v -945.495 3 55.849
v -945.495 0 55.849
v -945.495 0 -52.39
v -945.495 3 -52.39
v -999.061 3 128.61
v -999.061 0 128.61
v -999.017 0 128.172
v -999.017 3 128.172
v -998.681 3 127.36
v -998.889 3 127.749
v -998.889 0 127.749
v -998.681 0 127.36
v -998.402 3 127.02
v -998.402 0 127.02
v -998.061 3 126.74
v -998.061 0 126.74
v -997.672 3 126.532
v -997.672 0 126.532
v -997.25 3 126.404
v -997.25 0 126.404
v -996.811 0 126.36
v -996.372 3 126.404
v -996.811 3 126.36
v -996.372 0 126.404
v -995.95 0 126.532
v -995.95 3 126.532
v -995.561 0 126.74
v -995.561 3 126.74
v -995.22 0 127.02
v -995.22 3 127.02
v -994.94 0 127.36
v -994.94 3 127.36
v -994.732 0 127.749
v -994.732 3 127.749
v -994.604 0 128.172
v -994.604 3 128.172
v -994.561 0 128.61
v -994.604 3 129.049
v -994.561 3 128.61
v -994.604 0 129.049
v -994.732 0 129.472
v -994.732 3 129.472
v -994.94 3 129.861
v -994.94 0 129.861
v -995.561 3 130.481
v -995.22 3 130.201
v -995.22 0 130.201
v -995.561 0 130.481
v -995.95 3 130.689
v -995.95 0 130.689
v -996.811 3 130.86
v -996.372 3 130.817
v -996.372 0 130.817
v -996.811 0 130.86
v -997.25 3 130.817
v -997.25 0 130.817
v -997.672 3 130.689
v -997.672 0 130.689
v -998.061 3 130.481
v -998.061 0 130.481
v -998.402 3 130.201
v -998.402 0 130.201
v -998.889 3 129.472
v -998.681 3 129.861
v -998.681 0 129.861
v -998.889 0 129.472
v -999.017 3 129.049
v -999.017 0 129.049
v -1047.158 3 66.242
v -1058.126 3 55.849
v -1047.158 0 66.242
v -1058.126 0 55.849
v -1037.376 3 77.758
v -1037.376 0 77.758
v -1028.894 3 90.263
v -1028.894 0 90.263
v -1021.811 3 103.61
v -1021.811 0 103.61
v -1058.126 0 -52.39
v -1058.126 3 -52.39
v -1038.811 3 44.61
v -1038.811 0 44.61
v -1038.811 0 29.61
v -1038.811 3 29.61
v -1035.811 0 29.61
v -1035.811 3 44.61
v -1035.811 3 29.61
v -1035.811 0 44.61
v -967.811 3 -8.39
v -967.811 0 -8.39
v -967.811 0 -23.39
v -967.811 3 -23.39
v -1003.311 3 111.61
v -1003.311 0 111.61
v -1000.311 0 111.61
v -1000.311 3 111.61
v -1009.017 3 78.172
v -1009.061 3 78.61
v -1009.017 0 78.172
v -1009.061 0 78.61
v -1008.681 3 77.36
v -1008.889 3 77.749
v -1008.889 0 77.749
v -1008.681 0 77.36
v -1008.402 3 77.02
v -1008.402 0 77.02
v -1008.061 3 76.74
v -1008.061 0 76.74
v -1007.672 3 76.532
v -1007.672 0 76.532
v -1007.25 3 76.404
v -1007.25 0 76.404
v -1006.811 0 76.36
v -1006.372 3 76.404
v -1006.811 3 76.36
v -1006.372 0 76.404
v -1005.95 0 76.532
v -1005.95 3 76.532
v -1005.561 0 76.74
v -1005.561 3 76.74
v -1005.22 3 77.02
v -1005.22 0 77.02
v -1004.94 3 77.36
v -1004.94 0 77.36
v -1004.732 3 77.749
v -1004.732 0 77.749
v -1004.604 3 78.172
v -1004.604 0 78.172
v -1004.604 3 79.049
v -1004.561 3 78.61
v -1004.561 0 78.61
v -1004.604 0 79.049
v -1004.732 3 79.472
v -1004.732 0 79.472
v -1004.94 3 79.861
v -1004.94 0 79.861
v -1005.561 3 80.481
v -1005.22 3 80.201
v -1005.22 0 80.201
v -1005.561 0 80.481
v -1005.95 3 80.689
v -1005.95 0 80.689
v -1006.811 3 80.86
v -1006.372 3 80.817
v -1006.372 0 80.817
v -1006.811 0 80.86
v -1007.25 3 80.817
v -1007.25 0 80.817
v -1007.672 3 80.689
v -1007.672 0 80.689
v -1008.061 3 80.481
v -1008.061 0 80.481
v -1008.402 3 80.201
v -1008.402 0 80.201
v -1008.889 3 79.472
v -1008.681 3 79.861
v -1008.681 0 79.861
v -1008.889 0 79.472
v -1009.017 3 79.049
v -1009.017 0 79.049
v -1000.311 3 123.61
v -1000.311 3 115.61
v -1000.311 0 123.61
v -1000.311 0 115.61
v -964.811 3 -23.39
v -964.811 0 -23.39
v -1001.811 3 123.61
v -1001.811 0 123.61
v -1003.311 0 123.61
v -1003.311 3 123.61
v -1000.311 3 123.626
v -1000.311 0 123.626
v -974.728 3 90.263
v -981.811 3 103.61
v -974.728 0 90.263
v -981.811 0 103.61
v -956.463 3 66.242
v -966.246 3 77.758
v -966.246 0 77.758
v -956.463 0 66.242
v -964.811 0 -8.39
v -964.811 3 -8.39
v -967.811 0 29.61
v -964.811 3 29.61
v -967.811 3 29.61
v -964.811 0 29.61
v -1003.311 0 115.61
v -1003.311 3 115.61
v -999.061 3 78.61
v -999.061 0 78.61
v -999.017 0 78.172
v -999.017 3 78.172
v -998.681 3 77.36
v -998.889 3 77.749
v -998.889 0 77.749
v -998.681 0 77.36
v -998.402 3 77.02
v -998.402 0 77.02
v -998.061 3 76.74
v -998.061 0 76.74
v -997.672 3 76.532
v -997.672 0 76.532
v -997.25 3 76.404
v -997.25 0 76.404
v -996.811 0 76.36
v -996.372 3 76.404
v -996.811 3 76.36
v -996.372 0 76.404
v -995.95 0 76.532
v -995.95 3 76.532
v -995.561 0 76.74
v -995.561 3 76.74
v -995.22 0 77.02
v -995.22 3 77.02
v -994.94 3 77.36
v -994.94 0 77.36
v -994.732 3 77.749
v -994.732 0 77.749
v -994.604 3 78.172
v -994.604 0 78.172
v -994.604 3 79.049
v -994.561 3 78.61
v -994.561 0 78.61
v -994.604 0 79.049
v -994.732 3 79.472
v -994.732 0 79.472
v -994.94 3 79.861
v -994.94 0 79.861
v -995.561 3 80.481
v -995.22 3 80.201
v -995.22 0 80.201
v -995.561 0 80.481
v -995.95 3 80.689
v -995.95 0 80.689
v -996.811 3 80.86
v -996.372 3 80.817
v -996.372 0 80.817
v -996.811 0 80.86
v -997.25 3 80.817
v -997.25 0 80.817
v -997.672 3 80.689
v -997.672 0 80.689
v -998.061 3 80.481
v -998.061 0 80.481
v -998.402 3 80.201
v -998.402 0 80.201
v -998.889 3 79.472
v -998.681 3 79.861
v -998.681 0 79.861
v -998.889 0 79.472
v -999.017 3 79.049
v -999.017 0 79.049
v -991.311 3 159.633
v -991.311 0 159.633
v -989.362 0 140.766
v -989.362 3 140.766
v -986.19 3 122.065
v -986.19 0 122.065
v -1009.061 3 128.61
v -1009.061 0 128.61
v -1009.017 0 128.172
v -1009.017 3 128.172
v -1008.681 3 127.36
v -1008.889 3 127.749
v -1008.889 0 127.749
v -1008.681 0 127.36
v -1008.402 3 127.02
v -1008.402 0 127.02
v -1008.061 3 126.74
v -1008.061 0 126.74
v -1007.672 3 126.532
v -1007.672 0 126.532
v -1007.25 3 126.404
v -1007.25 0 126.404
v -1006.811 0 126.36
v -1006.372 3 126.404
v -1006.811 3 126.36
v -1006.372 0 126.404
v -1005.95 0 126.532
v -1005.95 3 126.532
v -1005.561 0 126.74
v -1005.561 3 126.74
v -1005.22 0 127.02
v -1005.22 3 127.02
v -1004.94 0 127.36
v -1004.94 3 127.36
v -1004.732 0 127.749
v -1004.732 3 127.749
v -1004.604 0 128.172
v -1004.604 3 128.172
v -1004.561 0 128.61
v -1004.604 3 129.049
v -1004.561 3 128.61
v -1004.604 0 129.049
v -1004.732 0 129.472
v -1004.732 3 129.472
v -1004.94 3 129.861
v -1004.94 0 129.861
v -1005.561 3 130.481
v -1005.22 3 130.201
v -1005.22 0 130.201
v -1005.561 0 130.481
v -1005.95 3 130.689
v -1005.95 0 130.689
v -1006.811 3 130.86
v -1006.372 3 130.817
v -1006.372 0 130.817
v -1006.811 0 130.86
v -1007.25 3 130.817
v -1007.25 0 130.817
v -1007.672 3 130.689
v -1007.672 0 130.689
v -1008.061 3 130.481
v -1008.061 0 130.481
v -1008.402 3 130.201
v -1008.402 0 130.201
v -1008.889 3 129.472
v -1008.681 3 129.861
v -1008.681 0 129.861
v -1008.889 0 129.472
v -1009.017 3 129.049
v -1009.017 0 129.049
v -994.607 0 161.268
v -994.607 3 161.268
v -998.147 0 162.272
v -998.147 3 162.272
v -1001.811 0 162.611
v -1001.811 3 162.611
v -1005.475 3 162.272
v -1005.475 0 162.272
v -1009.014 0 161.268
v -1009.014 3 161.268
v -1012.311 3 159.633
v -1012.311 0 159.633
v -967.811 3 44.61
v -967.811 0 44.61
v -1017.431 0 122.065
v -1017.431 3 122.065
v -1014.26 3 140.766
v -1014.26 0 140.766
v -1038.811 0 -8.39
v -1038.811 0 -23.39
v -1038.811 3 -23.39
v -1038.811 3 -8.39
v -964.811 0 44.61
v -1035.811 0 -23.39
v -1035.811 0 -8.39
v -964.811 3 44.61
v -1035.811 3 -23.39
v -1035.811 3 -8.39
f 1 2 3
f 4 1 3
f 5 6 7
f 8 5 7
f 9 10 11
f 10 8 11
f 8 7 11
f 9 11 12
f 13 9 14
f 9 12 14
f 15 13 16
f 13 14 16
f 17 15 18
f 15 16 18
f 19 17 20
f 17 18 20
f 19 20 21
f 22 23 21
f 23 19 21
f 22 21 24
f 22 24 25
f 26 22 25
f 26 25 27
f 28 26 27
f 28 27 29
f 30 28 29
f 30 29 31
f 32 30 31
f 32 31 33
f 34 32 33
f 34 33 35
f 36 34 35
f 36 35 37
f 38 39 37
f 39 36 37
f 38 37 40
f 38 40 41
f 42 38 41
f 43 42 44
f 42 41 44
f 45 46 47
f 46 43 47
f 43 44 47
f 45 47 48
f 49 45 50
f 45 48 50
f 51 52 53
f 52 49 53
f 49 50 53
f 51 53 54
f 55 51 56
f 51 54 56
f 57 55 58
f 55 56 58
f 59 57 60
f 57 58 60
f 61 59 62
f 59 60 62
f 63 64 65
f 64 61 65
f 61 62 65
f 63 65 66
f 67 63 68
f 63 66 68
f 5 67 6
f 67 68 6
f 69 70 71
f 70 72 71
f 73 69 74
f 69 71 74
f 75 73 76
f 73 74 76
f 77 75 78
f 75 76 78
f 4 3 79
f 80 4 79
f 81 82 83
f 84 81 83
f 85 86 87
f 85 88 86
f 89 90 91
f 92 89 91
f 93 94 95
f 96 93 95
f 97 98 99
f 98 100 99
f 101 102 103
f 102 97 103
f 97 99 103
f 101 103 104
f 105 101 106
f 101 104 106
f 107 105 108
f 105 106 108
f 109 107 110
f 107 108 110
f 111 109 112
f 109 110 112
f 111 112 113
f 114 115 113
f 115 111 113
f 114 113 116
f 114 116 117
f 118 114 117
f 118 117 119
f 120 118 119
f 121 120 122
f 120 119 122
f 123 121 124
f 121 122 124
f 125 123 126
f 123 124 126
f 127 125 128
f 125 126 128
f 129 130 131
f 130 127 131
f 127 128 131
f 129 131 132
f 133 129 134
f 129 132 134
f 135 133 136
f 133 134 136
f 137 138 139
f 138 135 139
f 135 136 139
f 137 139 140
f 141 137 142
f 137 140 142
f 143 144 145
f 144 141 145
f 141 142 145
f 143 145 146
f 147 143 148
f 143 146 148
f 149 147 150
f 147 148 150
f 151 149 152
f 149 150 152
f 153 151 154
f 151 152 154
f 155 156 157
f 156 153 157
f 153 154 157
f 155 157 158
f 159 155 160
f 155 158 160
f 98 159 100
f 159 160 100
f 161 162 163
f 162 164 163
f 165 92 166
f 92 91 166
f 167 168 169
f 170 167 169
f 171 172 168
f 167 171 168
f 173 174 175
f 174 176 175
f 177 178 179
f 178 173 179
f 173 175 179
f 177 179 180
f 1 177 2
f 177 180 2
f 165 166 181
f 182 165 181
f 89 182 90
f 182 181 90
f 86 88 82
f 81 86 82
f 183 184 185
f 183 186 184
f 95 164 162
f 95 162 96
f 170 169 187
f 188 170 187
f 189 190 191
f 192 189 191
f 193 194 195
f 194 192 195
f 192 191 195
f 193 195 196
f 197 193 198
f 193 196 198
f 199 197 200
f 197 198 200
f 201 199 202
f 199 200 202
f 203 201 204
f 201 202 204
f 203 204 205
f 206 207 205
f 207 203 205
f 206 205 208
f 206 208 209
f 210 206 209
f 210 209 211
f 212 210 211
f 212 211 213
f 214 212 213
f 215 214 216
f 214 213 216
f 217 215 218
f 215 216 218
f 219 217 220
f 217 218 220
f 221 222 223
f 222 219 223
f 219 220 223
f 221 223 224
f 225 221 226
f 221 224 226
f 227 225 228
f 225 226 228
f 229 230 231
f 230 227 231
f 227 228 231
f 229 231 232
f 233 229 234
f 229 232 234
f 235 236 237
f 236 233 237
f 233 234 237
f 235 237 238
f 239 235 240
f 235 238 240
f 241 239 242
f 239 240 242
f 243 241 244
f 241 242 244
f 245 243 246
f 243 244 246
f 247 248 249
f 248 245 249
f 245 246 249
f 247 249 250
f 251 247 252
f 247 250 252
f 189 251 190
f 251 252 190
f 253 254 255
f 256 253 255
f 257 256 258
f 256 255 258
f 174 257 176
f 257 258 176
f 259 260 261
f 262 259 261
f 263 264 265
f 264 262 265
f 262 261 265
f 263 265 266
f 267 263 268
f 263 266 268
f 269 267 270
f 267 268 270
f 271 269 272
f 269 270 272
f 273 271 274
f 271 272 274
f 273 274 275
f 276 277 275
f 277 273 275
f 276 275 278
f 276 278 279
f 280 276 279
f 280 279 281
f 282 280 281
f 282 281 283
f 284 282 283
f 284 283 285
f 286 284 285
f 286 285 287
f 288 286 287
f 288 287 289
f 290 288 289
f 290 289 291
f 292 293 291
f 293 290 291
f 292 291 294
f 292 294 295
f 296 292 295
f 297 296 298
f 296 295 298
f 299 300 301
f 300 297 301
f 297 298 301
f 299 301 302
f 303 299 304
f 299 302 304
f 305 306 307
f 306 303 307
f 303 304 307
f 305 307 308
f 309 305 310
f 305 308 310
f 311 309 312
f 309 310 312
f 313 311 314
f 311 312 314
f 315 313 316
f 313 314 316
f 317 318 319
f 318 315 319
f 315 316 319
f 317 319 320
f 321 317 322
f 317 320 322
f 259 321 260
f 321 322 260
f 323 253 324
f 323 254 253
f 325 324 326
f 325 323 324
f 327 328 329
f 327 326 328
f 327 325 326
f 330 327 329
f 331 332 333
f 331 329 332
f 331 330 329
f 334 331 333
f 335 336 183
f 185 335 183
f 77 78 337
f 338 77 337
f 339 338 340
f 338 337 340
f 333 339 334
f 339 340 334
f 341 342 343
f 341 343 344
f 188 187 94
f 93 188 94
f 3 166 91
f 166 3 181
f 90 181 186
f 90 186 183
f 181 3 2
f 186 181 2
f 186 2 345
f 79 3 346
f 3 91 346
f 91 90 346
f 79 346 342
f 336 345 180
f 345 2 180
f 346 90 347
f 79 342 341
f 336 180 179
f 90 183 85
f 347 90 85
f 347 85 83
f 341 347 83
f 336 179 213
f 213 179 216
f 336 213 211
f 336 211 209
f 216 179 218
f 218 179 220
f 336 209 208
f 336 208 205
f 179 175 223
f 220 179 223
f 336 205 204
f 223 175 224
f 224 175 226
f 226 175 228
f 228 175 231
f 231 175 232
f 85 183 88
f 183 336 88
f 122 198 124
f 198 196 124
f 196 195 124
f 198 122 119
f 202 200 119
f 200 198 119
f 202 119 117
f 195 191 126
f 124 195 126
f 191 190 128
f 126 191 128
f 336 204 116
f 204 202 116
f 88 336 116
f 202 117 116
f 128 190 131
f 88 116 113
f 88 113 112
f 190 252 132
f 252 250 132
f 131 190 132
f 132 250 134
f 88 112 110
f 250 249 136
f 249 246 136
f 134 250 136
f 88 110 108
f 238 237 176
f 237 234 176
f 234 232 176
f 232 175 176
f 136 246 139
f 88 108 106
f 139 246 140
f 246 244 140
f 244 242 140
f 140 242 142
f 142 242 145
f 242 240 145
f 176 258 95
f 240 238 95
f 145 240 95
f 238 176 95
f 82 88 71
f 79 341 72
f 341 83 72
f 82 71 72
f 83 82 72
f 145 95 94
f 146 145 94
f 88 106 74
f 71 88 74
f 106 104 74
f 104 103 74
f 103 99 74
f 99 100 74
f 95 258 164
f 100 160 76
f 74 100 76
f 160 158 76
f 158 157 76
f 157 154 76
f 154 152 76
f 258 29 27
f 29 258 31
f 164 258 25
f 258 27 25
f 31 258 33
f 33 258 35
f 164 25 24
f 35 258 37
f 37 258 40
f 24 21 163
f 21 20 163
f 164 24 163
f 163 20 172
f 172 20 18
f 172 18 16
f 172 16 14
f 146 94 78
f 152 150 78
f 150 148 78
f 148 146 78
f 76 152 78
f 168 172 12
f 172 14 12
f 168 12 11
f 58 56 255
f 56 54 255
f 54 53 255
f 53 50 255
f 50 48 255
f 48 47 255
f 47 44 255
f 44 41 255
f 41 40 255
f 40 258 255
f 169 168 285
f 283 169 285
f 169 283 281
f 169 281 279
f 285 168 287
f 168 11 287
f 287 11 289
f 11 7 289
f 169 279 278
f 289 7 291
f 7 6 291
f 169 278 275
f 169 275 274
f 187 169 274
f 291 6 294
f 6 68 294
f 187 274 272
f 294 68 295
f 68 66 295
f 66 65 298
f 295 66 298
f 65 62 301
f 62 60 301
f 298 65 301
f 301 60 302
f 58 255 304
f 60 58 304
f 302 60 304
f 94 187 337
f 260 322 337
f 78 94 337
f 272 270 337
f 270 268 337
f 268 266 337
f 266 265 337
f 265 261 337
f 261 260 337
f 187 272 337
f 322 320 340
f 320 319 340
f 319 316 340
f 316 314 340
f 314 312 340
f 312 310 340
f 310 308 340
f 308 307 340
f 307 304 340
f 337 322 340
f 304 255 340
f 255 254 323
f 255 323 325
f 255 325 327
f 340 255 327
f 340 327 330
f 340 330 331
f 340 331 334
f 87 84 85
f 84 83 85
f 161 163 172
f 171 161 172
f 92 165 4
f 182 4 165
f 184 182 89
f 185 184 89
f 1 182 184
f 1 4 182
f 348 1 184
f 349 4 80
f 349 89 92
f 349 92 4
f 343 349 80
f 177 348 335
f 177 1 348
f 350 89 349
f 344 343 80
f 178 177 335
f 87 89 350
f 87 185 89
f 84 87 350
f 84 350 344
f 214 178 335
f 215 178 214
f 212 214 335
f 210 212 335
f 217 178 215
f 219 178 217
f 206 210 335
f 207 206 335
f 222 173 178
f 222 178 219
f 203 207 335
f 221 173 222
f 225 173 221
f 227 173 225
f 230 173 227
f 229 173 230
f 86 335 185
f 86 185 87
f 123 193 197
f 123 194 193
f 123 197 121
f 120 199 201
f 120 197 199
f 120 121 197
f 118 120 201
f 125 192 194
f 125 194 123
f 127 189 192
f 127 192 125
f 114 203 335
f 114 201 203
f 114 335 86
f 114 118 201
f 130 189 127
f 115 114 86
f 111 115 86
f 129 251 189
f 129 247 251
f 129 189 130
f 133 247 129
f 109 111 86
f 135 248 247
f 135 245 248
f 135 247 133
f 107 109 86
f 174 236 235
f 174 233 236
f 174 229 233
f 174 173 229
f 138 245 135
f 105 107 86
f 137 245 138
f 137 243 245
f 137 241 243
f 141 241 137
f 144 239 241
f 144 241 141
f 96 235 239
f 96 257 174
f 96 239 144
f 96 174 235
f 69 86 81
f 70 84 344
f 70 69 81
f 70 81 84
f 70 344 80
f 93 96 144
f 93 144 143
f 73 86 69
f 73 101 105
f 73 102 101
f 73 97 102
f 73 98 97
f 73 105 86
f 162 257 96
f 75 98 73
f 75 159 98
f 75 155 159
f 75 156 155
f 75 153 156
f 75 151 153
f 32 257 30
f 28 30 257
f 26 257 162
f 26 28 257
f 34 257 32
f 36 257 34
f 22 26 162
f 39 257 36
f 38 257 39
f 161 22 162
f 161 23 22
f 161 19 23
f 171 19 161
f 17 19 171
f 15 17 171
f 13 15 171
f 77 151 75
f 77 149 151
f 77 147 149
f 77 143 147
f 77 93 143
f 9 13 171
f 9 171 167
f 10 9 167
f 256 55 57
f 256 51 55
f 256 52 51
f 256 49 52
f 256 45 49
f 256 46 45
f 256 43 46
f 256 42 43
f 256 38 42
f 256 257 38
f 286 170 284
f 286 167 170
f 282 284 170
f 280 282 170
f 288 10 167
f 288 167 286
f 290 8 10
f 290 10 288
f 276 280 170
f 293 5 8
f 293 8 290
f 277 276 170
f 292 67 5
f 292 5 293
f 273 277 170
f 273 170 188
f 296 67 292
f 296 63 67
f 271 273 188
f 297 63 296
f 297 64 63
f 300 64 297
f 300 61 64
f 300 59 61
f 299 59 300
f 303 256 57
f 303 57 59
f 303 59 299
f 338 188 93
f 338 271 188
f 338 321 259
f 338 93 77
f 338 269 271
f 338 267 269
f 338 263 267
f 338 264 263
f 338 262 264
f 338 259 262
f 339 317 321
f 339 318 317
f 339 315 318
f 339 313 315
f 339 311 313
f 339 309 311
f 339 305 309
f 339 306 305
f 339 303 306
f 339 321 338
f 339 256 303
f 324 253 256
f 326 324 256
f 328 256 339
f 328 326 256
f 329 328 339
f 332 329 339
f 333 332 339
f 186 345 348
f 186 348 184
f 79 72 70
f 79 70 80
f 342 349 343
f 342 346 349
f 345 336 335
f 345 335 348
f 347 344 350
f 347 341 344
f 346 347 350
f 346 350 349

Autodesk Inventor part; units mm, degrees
ref_plane "YZ Plane" through (0, 0, 0) normal (1, 0, 0) x (0, 1, 0)
ref_plane "XZ Plane" through (0, 0, 0) normal (0, 1, 0) x (-1, 0, 0)
ref_plane "XY Plane" through (0, 0, 0) normal (0, 0, 1) x (1, 0, 0)
sketch "Sketch1" plane through (0, 0, 0) normal (0, 1, 0) x (-1, 0, 0)
  line L0 (945.4953, -52.3895) -> (1058.1259, -52.3895)
  arc A0 (945.4953, 55.8486) -> (981.8106, 103.6105) centre (854.964, 162.3701) ccw
  arc A1 (1021.8106, 103.6105) -> (1058.1259, 55.8486) centre (1148.6572, 162.3701) ccw
  line L1 (967.8106, 44.6105) -> (967.8106, 29.6105)
  line L2 (967.8106, -8.3895) -> (967.8106, -23.3895)
  line L3 (967.8106, 44.6105) -> (964.8106, 44.6105)
  line L4 (964.8106, 44.6105) -> (964.8106, 29.6105)
  line L5 (964.8106, 29.6105) -> (967.8106, 29.6105)
  line L6 (967.8106, -23.3895) -> (964.8106, -23.3895)
  line L7 (964.8106, -23.3895) -> (964.8106, -8.3895)
  line L8 (964.8106, -8.3895) -> (967.8106, -8.3895)
  line L9 (1035.8106, 44.6105) -> (1035.8106, 29.6105)
  line L10 (1035.8106, -8.3895) -> (1035.8106, -23.3895)
  line L11 (1035.8106, 44.6105) -> (1038.8106, 44.6105)
  line L12 (1038.8106, 44.6105) -> (1038.8106, 29.6105)
  line L13 (1038.8106, 29.6105) -> (1035.8106, 29.6105)
  line L14 (1035.8106, -23.3895) -> (1038.8106, -23.3895)
  line L15 (1038.8106, -23.3895) -> (1038.8106, -8.3895)
  line L16 (1038.8106, -8.3895) -> (1035.8106, -8.3895)
  line L17 (1058.1259, 55.8486) -> (1058.1259, -52.3895)
  line L18 (945.4953, 55.8486) -> (945.4953, -52.3895)
  line L19 (1001.8106, 123.6105) -> (1003.3106, 123.6105)
  line L20 (1003.3106, 123.6105) -> (1003.3106, 115.6105)
  line L21 (1003.3106, 111.6105) -> (1000.3106, 111.6105)
  line L22 (1000.3106, 115.6105) -> (1000.3106, 123.6257)
  line L23 (1000.3106, 123.6257) -> (1001.8106, 123.6105)
  line L24 (1003.3106, 115.6105) -> (1003.3106, 111.6105)
  line L25 (1000.3106, 115.6105) -> (1000.3106, 111.6105)
  arc A2 (1012.3106, 159.6326) -> (991.3106, 159.6326) centre (1001.8106, 142.6105) ccw
  arc A3 (981.8106, 103.6105) -> (991.3106, 159.6326) centre (700.3575, 180.1548) ccw
  arc A4 (1012.3106, 159.6326) -> (1021.8106, 103.6105) centre (1303.2637, 180.1548) ccw
  arc A5 (945.4953, 55.8486) -> (981.8106, 103.6105) centre (854.964, 162.3701) ccw
  arc A6 (1021.8106, 103.6105) -> (1058.1259, 55.8486) centre (1148.6572, 162.3701) ccw
  line L26 (1001.8106, 123.6105) -> (1003.3106, 123.6105)
  line L27 (1003.3106, 123.6105) -> (1003.3106, 115.6105)
  line L28 (1003.3106, 111.6105) -> (1000.3106, 111.6105)
  line L29 (1000.3106, 115.6105) -> (1000.3106, 123.6105)
  line L30 (1000.3106, 123.6105) -> (1001.8106, 123.6105)
  line L31 (1000.3106, 111.6105) -> (1000.3106, 115.6105)
  line L32 (1003.3106, 111.6105) -> (1003.3106, 115.6105)
  line L33 (1001.8106, 103.6105) -> (1086.8106, 103.6105) construction
  line L34 (1001.8106, 103.6105) -> (916.8106, 103.6105) construction
  line L35 (1086.8106, 133.6105) -> (1071.8106, 133.6105) construction
  line L36 (1071.8106, 133.6105) -> (1071.8106, 73.6105) construction
  line L37 (1071.8106, 73.6105) -> (1101.8106, 73.6105) construction
  line L38 (1101.8106, 73.6105) -> (1101.8106, 133.6105) construction
  line L39 (1101.8106, 133.6105) -> (1086.8106, 133.6105) construction
  line L40 (916.8106, 133.6105) -> (931.8106, 133.6105) construction
  line L41 (931.8106, 133.6105) -> (931.8106, 73.6105) construction
  line L42 (931.8106, 73.6105) -> (901.8106, 73.6105) construction
  line L43 (901.8106, 73.6105) -> (901.8106, 133.6105) construction
  line L44 (901.8106, 133.6105) -> (916.8106, 133.6105) construction
  line L45 (931.8106, 103.6105) -> (935.8106, 103.6105) construction
  line L46 (935.8106, 103.6105) -> (935.8106, 108.6105) construction
  line L47 (1071.8106, 103.6105) -> (1067.8106, 103.6105) construction
  line L48 (1067.8106, 103.6105) -> (1067.8106, 108.6105) construction
  line L49 (935.8106, 103.6105) -> (939.8106, 103.6105) construction
  line L50 (1067.8106, 103.6105) -> (1063.8106, 103.6105) construction
  line L51 (939.8106, 103.6105) -> (949.8106, 103.6105) construction
  line L52 (949.8106, 103.6105) -> (996.7952, 86.5095) construction
  line L53 (949.8106, 103.6105) -> (996.7952, 120.7115) construction
  line L54 (1063.8106, 103.6105) -> (1053.8106, 103.6105) construction
  line L55 (1053.8106, 103.6105) -> (1006.826, 120.7115) construction
  line L56 (1053.8106, 103.6105) -> (1006.826, 86.5095) construction
  line L57 (939.8106, 103.6105) -> (952.4597, 65.6632) construction
  line L58 (952.4597, 65.6632) -> (1051.1615, 65.6632) construction
  line L59 (1051.1615, 65.6632) -> (1063.8106, 103.6105) construction
  line L60 (1001.8106, 123.6105) -> (1001.8106, 168.6105) construction
  line L61 (1001.8106, 123.6105) -> (1003.3106, 123.6105)
  line L62 (1003.3106, 123.6105) -> (1003.3106, 115.6105)
  line L63 (1003.3106, 111.6105) -> (1000.3106, 111.6105)
  line L64 (1000.3106, 115.6105) -> (1000.3106, 123.6257)
  line L65 (1000.3106, 123.6257) -> (1001.8106, 123.6105)
  line L66 (1003.3106, 115.6105) -> (1003.3106, 111.6105)
  line L67 (1000.3106, 115.6105) -> (1000.3106, 111.6105)
  arc A7 (1012.3106, 159.6326) -> (991.3106, 159.6326) centre (1001.8106, 142.6105) ccw
  arc A8 (981.8106, 103.6105) -> (991.3106, 159.6326) centre (700.3575, 180.1548) ccw
  arc A9 (1012.3106, 159.6326) -> (1021.8106, 103.6105) centre (1303.2637, 180.1548) ccw
  line L68 (1001.8106, 78.6105) -> (1006.8106, 78.6105) construction
  line L69 (1006.8106, 78.6105) -> (1006.8106, 128.6105) construction
  line L70 (1006.8106, 128.6105) -> (996.8106, 128.6105) construction
  line L71 (996.8106, 128.6105) -> (996.8106, 78.6105) construction
  line L72 (996.8106, 78.6105) -> (1001.8106, 78.6105) construction
  circle A10 centre (1006.8106, 78.6105) radius 2.25
  circle A11 centre (996.8106, 78.6105) radius 2.25
  circle A12 centre (1006.8106, 128.6105) radius 2.25
  circle A13 centre (996.8106, 128.6105) radius 2.25
  point P0 (0, 0)
extrude "Extrusion1" add sketch "Sketch1" along normal blind 3
ref_plane "Work Plane1" through (-1001.8106, 0, 55.8486) normal (1, 0, 0) x (0, 0, -1)
properties part number "上底盤新"
